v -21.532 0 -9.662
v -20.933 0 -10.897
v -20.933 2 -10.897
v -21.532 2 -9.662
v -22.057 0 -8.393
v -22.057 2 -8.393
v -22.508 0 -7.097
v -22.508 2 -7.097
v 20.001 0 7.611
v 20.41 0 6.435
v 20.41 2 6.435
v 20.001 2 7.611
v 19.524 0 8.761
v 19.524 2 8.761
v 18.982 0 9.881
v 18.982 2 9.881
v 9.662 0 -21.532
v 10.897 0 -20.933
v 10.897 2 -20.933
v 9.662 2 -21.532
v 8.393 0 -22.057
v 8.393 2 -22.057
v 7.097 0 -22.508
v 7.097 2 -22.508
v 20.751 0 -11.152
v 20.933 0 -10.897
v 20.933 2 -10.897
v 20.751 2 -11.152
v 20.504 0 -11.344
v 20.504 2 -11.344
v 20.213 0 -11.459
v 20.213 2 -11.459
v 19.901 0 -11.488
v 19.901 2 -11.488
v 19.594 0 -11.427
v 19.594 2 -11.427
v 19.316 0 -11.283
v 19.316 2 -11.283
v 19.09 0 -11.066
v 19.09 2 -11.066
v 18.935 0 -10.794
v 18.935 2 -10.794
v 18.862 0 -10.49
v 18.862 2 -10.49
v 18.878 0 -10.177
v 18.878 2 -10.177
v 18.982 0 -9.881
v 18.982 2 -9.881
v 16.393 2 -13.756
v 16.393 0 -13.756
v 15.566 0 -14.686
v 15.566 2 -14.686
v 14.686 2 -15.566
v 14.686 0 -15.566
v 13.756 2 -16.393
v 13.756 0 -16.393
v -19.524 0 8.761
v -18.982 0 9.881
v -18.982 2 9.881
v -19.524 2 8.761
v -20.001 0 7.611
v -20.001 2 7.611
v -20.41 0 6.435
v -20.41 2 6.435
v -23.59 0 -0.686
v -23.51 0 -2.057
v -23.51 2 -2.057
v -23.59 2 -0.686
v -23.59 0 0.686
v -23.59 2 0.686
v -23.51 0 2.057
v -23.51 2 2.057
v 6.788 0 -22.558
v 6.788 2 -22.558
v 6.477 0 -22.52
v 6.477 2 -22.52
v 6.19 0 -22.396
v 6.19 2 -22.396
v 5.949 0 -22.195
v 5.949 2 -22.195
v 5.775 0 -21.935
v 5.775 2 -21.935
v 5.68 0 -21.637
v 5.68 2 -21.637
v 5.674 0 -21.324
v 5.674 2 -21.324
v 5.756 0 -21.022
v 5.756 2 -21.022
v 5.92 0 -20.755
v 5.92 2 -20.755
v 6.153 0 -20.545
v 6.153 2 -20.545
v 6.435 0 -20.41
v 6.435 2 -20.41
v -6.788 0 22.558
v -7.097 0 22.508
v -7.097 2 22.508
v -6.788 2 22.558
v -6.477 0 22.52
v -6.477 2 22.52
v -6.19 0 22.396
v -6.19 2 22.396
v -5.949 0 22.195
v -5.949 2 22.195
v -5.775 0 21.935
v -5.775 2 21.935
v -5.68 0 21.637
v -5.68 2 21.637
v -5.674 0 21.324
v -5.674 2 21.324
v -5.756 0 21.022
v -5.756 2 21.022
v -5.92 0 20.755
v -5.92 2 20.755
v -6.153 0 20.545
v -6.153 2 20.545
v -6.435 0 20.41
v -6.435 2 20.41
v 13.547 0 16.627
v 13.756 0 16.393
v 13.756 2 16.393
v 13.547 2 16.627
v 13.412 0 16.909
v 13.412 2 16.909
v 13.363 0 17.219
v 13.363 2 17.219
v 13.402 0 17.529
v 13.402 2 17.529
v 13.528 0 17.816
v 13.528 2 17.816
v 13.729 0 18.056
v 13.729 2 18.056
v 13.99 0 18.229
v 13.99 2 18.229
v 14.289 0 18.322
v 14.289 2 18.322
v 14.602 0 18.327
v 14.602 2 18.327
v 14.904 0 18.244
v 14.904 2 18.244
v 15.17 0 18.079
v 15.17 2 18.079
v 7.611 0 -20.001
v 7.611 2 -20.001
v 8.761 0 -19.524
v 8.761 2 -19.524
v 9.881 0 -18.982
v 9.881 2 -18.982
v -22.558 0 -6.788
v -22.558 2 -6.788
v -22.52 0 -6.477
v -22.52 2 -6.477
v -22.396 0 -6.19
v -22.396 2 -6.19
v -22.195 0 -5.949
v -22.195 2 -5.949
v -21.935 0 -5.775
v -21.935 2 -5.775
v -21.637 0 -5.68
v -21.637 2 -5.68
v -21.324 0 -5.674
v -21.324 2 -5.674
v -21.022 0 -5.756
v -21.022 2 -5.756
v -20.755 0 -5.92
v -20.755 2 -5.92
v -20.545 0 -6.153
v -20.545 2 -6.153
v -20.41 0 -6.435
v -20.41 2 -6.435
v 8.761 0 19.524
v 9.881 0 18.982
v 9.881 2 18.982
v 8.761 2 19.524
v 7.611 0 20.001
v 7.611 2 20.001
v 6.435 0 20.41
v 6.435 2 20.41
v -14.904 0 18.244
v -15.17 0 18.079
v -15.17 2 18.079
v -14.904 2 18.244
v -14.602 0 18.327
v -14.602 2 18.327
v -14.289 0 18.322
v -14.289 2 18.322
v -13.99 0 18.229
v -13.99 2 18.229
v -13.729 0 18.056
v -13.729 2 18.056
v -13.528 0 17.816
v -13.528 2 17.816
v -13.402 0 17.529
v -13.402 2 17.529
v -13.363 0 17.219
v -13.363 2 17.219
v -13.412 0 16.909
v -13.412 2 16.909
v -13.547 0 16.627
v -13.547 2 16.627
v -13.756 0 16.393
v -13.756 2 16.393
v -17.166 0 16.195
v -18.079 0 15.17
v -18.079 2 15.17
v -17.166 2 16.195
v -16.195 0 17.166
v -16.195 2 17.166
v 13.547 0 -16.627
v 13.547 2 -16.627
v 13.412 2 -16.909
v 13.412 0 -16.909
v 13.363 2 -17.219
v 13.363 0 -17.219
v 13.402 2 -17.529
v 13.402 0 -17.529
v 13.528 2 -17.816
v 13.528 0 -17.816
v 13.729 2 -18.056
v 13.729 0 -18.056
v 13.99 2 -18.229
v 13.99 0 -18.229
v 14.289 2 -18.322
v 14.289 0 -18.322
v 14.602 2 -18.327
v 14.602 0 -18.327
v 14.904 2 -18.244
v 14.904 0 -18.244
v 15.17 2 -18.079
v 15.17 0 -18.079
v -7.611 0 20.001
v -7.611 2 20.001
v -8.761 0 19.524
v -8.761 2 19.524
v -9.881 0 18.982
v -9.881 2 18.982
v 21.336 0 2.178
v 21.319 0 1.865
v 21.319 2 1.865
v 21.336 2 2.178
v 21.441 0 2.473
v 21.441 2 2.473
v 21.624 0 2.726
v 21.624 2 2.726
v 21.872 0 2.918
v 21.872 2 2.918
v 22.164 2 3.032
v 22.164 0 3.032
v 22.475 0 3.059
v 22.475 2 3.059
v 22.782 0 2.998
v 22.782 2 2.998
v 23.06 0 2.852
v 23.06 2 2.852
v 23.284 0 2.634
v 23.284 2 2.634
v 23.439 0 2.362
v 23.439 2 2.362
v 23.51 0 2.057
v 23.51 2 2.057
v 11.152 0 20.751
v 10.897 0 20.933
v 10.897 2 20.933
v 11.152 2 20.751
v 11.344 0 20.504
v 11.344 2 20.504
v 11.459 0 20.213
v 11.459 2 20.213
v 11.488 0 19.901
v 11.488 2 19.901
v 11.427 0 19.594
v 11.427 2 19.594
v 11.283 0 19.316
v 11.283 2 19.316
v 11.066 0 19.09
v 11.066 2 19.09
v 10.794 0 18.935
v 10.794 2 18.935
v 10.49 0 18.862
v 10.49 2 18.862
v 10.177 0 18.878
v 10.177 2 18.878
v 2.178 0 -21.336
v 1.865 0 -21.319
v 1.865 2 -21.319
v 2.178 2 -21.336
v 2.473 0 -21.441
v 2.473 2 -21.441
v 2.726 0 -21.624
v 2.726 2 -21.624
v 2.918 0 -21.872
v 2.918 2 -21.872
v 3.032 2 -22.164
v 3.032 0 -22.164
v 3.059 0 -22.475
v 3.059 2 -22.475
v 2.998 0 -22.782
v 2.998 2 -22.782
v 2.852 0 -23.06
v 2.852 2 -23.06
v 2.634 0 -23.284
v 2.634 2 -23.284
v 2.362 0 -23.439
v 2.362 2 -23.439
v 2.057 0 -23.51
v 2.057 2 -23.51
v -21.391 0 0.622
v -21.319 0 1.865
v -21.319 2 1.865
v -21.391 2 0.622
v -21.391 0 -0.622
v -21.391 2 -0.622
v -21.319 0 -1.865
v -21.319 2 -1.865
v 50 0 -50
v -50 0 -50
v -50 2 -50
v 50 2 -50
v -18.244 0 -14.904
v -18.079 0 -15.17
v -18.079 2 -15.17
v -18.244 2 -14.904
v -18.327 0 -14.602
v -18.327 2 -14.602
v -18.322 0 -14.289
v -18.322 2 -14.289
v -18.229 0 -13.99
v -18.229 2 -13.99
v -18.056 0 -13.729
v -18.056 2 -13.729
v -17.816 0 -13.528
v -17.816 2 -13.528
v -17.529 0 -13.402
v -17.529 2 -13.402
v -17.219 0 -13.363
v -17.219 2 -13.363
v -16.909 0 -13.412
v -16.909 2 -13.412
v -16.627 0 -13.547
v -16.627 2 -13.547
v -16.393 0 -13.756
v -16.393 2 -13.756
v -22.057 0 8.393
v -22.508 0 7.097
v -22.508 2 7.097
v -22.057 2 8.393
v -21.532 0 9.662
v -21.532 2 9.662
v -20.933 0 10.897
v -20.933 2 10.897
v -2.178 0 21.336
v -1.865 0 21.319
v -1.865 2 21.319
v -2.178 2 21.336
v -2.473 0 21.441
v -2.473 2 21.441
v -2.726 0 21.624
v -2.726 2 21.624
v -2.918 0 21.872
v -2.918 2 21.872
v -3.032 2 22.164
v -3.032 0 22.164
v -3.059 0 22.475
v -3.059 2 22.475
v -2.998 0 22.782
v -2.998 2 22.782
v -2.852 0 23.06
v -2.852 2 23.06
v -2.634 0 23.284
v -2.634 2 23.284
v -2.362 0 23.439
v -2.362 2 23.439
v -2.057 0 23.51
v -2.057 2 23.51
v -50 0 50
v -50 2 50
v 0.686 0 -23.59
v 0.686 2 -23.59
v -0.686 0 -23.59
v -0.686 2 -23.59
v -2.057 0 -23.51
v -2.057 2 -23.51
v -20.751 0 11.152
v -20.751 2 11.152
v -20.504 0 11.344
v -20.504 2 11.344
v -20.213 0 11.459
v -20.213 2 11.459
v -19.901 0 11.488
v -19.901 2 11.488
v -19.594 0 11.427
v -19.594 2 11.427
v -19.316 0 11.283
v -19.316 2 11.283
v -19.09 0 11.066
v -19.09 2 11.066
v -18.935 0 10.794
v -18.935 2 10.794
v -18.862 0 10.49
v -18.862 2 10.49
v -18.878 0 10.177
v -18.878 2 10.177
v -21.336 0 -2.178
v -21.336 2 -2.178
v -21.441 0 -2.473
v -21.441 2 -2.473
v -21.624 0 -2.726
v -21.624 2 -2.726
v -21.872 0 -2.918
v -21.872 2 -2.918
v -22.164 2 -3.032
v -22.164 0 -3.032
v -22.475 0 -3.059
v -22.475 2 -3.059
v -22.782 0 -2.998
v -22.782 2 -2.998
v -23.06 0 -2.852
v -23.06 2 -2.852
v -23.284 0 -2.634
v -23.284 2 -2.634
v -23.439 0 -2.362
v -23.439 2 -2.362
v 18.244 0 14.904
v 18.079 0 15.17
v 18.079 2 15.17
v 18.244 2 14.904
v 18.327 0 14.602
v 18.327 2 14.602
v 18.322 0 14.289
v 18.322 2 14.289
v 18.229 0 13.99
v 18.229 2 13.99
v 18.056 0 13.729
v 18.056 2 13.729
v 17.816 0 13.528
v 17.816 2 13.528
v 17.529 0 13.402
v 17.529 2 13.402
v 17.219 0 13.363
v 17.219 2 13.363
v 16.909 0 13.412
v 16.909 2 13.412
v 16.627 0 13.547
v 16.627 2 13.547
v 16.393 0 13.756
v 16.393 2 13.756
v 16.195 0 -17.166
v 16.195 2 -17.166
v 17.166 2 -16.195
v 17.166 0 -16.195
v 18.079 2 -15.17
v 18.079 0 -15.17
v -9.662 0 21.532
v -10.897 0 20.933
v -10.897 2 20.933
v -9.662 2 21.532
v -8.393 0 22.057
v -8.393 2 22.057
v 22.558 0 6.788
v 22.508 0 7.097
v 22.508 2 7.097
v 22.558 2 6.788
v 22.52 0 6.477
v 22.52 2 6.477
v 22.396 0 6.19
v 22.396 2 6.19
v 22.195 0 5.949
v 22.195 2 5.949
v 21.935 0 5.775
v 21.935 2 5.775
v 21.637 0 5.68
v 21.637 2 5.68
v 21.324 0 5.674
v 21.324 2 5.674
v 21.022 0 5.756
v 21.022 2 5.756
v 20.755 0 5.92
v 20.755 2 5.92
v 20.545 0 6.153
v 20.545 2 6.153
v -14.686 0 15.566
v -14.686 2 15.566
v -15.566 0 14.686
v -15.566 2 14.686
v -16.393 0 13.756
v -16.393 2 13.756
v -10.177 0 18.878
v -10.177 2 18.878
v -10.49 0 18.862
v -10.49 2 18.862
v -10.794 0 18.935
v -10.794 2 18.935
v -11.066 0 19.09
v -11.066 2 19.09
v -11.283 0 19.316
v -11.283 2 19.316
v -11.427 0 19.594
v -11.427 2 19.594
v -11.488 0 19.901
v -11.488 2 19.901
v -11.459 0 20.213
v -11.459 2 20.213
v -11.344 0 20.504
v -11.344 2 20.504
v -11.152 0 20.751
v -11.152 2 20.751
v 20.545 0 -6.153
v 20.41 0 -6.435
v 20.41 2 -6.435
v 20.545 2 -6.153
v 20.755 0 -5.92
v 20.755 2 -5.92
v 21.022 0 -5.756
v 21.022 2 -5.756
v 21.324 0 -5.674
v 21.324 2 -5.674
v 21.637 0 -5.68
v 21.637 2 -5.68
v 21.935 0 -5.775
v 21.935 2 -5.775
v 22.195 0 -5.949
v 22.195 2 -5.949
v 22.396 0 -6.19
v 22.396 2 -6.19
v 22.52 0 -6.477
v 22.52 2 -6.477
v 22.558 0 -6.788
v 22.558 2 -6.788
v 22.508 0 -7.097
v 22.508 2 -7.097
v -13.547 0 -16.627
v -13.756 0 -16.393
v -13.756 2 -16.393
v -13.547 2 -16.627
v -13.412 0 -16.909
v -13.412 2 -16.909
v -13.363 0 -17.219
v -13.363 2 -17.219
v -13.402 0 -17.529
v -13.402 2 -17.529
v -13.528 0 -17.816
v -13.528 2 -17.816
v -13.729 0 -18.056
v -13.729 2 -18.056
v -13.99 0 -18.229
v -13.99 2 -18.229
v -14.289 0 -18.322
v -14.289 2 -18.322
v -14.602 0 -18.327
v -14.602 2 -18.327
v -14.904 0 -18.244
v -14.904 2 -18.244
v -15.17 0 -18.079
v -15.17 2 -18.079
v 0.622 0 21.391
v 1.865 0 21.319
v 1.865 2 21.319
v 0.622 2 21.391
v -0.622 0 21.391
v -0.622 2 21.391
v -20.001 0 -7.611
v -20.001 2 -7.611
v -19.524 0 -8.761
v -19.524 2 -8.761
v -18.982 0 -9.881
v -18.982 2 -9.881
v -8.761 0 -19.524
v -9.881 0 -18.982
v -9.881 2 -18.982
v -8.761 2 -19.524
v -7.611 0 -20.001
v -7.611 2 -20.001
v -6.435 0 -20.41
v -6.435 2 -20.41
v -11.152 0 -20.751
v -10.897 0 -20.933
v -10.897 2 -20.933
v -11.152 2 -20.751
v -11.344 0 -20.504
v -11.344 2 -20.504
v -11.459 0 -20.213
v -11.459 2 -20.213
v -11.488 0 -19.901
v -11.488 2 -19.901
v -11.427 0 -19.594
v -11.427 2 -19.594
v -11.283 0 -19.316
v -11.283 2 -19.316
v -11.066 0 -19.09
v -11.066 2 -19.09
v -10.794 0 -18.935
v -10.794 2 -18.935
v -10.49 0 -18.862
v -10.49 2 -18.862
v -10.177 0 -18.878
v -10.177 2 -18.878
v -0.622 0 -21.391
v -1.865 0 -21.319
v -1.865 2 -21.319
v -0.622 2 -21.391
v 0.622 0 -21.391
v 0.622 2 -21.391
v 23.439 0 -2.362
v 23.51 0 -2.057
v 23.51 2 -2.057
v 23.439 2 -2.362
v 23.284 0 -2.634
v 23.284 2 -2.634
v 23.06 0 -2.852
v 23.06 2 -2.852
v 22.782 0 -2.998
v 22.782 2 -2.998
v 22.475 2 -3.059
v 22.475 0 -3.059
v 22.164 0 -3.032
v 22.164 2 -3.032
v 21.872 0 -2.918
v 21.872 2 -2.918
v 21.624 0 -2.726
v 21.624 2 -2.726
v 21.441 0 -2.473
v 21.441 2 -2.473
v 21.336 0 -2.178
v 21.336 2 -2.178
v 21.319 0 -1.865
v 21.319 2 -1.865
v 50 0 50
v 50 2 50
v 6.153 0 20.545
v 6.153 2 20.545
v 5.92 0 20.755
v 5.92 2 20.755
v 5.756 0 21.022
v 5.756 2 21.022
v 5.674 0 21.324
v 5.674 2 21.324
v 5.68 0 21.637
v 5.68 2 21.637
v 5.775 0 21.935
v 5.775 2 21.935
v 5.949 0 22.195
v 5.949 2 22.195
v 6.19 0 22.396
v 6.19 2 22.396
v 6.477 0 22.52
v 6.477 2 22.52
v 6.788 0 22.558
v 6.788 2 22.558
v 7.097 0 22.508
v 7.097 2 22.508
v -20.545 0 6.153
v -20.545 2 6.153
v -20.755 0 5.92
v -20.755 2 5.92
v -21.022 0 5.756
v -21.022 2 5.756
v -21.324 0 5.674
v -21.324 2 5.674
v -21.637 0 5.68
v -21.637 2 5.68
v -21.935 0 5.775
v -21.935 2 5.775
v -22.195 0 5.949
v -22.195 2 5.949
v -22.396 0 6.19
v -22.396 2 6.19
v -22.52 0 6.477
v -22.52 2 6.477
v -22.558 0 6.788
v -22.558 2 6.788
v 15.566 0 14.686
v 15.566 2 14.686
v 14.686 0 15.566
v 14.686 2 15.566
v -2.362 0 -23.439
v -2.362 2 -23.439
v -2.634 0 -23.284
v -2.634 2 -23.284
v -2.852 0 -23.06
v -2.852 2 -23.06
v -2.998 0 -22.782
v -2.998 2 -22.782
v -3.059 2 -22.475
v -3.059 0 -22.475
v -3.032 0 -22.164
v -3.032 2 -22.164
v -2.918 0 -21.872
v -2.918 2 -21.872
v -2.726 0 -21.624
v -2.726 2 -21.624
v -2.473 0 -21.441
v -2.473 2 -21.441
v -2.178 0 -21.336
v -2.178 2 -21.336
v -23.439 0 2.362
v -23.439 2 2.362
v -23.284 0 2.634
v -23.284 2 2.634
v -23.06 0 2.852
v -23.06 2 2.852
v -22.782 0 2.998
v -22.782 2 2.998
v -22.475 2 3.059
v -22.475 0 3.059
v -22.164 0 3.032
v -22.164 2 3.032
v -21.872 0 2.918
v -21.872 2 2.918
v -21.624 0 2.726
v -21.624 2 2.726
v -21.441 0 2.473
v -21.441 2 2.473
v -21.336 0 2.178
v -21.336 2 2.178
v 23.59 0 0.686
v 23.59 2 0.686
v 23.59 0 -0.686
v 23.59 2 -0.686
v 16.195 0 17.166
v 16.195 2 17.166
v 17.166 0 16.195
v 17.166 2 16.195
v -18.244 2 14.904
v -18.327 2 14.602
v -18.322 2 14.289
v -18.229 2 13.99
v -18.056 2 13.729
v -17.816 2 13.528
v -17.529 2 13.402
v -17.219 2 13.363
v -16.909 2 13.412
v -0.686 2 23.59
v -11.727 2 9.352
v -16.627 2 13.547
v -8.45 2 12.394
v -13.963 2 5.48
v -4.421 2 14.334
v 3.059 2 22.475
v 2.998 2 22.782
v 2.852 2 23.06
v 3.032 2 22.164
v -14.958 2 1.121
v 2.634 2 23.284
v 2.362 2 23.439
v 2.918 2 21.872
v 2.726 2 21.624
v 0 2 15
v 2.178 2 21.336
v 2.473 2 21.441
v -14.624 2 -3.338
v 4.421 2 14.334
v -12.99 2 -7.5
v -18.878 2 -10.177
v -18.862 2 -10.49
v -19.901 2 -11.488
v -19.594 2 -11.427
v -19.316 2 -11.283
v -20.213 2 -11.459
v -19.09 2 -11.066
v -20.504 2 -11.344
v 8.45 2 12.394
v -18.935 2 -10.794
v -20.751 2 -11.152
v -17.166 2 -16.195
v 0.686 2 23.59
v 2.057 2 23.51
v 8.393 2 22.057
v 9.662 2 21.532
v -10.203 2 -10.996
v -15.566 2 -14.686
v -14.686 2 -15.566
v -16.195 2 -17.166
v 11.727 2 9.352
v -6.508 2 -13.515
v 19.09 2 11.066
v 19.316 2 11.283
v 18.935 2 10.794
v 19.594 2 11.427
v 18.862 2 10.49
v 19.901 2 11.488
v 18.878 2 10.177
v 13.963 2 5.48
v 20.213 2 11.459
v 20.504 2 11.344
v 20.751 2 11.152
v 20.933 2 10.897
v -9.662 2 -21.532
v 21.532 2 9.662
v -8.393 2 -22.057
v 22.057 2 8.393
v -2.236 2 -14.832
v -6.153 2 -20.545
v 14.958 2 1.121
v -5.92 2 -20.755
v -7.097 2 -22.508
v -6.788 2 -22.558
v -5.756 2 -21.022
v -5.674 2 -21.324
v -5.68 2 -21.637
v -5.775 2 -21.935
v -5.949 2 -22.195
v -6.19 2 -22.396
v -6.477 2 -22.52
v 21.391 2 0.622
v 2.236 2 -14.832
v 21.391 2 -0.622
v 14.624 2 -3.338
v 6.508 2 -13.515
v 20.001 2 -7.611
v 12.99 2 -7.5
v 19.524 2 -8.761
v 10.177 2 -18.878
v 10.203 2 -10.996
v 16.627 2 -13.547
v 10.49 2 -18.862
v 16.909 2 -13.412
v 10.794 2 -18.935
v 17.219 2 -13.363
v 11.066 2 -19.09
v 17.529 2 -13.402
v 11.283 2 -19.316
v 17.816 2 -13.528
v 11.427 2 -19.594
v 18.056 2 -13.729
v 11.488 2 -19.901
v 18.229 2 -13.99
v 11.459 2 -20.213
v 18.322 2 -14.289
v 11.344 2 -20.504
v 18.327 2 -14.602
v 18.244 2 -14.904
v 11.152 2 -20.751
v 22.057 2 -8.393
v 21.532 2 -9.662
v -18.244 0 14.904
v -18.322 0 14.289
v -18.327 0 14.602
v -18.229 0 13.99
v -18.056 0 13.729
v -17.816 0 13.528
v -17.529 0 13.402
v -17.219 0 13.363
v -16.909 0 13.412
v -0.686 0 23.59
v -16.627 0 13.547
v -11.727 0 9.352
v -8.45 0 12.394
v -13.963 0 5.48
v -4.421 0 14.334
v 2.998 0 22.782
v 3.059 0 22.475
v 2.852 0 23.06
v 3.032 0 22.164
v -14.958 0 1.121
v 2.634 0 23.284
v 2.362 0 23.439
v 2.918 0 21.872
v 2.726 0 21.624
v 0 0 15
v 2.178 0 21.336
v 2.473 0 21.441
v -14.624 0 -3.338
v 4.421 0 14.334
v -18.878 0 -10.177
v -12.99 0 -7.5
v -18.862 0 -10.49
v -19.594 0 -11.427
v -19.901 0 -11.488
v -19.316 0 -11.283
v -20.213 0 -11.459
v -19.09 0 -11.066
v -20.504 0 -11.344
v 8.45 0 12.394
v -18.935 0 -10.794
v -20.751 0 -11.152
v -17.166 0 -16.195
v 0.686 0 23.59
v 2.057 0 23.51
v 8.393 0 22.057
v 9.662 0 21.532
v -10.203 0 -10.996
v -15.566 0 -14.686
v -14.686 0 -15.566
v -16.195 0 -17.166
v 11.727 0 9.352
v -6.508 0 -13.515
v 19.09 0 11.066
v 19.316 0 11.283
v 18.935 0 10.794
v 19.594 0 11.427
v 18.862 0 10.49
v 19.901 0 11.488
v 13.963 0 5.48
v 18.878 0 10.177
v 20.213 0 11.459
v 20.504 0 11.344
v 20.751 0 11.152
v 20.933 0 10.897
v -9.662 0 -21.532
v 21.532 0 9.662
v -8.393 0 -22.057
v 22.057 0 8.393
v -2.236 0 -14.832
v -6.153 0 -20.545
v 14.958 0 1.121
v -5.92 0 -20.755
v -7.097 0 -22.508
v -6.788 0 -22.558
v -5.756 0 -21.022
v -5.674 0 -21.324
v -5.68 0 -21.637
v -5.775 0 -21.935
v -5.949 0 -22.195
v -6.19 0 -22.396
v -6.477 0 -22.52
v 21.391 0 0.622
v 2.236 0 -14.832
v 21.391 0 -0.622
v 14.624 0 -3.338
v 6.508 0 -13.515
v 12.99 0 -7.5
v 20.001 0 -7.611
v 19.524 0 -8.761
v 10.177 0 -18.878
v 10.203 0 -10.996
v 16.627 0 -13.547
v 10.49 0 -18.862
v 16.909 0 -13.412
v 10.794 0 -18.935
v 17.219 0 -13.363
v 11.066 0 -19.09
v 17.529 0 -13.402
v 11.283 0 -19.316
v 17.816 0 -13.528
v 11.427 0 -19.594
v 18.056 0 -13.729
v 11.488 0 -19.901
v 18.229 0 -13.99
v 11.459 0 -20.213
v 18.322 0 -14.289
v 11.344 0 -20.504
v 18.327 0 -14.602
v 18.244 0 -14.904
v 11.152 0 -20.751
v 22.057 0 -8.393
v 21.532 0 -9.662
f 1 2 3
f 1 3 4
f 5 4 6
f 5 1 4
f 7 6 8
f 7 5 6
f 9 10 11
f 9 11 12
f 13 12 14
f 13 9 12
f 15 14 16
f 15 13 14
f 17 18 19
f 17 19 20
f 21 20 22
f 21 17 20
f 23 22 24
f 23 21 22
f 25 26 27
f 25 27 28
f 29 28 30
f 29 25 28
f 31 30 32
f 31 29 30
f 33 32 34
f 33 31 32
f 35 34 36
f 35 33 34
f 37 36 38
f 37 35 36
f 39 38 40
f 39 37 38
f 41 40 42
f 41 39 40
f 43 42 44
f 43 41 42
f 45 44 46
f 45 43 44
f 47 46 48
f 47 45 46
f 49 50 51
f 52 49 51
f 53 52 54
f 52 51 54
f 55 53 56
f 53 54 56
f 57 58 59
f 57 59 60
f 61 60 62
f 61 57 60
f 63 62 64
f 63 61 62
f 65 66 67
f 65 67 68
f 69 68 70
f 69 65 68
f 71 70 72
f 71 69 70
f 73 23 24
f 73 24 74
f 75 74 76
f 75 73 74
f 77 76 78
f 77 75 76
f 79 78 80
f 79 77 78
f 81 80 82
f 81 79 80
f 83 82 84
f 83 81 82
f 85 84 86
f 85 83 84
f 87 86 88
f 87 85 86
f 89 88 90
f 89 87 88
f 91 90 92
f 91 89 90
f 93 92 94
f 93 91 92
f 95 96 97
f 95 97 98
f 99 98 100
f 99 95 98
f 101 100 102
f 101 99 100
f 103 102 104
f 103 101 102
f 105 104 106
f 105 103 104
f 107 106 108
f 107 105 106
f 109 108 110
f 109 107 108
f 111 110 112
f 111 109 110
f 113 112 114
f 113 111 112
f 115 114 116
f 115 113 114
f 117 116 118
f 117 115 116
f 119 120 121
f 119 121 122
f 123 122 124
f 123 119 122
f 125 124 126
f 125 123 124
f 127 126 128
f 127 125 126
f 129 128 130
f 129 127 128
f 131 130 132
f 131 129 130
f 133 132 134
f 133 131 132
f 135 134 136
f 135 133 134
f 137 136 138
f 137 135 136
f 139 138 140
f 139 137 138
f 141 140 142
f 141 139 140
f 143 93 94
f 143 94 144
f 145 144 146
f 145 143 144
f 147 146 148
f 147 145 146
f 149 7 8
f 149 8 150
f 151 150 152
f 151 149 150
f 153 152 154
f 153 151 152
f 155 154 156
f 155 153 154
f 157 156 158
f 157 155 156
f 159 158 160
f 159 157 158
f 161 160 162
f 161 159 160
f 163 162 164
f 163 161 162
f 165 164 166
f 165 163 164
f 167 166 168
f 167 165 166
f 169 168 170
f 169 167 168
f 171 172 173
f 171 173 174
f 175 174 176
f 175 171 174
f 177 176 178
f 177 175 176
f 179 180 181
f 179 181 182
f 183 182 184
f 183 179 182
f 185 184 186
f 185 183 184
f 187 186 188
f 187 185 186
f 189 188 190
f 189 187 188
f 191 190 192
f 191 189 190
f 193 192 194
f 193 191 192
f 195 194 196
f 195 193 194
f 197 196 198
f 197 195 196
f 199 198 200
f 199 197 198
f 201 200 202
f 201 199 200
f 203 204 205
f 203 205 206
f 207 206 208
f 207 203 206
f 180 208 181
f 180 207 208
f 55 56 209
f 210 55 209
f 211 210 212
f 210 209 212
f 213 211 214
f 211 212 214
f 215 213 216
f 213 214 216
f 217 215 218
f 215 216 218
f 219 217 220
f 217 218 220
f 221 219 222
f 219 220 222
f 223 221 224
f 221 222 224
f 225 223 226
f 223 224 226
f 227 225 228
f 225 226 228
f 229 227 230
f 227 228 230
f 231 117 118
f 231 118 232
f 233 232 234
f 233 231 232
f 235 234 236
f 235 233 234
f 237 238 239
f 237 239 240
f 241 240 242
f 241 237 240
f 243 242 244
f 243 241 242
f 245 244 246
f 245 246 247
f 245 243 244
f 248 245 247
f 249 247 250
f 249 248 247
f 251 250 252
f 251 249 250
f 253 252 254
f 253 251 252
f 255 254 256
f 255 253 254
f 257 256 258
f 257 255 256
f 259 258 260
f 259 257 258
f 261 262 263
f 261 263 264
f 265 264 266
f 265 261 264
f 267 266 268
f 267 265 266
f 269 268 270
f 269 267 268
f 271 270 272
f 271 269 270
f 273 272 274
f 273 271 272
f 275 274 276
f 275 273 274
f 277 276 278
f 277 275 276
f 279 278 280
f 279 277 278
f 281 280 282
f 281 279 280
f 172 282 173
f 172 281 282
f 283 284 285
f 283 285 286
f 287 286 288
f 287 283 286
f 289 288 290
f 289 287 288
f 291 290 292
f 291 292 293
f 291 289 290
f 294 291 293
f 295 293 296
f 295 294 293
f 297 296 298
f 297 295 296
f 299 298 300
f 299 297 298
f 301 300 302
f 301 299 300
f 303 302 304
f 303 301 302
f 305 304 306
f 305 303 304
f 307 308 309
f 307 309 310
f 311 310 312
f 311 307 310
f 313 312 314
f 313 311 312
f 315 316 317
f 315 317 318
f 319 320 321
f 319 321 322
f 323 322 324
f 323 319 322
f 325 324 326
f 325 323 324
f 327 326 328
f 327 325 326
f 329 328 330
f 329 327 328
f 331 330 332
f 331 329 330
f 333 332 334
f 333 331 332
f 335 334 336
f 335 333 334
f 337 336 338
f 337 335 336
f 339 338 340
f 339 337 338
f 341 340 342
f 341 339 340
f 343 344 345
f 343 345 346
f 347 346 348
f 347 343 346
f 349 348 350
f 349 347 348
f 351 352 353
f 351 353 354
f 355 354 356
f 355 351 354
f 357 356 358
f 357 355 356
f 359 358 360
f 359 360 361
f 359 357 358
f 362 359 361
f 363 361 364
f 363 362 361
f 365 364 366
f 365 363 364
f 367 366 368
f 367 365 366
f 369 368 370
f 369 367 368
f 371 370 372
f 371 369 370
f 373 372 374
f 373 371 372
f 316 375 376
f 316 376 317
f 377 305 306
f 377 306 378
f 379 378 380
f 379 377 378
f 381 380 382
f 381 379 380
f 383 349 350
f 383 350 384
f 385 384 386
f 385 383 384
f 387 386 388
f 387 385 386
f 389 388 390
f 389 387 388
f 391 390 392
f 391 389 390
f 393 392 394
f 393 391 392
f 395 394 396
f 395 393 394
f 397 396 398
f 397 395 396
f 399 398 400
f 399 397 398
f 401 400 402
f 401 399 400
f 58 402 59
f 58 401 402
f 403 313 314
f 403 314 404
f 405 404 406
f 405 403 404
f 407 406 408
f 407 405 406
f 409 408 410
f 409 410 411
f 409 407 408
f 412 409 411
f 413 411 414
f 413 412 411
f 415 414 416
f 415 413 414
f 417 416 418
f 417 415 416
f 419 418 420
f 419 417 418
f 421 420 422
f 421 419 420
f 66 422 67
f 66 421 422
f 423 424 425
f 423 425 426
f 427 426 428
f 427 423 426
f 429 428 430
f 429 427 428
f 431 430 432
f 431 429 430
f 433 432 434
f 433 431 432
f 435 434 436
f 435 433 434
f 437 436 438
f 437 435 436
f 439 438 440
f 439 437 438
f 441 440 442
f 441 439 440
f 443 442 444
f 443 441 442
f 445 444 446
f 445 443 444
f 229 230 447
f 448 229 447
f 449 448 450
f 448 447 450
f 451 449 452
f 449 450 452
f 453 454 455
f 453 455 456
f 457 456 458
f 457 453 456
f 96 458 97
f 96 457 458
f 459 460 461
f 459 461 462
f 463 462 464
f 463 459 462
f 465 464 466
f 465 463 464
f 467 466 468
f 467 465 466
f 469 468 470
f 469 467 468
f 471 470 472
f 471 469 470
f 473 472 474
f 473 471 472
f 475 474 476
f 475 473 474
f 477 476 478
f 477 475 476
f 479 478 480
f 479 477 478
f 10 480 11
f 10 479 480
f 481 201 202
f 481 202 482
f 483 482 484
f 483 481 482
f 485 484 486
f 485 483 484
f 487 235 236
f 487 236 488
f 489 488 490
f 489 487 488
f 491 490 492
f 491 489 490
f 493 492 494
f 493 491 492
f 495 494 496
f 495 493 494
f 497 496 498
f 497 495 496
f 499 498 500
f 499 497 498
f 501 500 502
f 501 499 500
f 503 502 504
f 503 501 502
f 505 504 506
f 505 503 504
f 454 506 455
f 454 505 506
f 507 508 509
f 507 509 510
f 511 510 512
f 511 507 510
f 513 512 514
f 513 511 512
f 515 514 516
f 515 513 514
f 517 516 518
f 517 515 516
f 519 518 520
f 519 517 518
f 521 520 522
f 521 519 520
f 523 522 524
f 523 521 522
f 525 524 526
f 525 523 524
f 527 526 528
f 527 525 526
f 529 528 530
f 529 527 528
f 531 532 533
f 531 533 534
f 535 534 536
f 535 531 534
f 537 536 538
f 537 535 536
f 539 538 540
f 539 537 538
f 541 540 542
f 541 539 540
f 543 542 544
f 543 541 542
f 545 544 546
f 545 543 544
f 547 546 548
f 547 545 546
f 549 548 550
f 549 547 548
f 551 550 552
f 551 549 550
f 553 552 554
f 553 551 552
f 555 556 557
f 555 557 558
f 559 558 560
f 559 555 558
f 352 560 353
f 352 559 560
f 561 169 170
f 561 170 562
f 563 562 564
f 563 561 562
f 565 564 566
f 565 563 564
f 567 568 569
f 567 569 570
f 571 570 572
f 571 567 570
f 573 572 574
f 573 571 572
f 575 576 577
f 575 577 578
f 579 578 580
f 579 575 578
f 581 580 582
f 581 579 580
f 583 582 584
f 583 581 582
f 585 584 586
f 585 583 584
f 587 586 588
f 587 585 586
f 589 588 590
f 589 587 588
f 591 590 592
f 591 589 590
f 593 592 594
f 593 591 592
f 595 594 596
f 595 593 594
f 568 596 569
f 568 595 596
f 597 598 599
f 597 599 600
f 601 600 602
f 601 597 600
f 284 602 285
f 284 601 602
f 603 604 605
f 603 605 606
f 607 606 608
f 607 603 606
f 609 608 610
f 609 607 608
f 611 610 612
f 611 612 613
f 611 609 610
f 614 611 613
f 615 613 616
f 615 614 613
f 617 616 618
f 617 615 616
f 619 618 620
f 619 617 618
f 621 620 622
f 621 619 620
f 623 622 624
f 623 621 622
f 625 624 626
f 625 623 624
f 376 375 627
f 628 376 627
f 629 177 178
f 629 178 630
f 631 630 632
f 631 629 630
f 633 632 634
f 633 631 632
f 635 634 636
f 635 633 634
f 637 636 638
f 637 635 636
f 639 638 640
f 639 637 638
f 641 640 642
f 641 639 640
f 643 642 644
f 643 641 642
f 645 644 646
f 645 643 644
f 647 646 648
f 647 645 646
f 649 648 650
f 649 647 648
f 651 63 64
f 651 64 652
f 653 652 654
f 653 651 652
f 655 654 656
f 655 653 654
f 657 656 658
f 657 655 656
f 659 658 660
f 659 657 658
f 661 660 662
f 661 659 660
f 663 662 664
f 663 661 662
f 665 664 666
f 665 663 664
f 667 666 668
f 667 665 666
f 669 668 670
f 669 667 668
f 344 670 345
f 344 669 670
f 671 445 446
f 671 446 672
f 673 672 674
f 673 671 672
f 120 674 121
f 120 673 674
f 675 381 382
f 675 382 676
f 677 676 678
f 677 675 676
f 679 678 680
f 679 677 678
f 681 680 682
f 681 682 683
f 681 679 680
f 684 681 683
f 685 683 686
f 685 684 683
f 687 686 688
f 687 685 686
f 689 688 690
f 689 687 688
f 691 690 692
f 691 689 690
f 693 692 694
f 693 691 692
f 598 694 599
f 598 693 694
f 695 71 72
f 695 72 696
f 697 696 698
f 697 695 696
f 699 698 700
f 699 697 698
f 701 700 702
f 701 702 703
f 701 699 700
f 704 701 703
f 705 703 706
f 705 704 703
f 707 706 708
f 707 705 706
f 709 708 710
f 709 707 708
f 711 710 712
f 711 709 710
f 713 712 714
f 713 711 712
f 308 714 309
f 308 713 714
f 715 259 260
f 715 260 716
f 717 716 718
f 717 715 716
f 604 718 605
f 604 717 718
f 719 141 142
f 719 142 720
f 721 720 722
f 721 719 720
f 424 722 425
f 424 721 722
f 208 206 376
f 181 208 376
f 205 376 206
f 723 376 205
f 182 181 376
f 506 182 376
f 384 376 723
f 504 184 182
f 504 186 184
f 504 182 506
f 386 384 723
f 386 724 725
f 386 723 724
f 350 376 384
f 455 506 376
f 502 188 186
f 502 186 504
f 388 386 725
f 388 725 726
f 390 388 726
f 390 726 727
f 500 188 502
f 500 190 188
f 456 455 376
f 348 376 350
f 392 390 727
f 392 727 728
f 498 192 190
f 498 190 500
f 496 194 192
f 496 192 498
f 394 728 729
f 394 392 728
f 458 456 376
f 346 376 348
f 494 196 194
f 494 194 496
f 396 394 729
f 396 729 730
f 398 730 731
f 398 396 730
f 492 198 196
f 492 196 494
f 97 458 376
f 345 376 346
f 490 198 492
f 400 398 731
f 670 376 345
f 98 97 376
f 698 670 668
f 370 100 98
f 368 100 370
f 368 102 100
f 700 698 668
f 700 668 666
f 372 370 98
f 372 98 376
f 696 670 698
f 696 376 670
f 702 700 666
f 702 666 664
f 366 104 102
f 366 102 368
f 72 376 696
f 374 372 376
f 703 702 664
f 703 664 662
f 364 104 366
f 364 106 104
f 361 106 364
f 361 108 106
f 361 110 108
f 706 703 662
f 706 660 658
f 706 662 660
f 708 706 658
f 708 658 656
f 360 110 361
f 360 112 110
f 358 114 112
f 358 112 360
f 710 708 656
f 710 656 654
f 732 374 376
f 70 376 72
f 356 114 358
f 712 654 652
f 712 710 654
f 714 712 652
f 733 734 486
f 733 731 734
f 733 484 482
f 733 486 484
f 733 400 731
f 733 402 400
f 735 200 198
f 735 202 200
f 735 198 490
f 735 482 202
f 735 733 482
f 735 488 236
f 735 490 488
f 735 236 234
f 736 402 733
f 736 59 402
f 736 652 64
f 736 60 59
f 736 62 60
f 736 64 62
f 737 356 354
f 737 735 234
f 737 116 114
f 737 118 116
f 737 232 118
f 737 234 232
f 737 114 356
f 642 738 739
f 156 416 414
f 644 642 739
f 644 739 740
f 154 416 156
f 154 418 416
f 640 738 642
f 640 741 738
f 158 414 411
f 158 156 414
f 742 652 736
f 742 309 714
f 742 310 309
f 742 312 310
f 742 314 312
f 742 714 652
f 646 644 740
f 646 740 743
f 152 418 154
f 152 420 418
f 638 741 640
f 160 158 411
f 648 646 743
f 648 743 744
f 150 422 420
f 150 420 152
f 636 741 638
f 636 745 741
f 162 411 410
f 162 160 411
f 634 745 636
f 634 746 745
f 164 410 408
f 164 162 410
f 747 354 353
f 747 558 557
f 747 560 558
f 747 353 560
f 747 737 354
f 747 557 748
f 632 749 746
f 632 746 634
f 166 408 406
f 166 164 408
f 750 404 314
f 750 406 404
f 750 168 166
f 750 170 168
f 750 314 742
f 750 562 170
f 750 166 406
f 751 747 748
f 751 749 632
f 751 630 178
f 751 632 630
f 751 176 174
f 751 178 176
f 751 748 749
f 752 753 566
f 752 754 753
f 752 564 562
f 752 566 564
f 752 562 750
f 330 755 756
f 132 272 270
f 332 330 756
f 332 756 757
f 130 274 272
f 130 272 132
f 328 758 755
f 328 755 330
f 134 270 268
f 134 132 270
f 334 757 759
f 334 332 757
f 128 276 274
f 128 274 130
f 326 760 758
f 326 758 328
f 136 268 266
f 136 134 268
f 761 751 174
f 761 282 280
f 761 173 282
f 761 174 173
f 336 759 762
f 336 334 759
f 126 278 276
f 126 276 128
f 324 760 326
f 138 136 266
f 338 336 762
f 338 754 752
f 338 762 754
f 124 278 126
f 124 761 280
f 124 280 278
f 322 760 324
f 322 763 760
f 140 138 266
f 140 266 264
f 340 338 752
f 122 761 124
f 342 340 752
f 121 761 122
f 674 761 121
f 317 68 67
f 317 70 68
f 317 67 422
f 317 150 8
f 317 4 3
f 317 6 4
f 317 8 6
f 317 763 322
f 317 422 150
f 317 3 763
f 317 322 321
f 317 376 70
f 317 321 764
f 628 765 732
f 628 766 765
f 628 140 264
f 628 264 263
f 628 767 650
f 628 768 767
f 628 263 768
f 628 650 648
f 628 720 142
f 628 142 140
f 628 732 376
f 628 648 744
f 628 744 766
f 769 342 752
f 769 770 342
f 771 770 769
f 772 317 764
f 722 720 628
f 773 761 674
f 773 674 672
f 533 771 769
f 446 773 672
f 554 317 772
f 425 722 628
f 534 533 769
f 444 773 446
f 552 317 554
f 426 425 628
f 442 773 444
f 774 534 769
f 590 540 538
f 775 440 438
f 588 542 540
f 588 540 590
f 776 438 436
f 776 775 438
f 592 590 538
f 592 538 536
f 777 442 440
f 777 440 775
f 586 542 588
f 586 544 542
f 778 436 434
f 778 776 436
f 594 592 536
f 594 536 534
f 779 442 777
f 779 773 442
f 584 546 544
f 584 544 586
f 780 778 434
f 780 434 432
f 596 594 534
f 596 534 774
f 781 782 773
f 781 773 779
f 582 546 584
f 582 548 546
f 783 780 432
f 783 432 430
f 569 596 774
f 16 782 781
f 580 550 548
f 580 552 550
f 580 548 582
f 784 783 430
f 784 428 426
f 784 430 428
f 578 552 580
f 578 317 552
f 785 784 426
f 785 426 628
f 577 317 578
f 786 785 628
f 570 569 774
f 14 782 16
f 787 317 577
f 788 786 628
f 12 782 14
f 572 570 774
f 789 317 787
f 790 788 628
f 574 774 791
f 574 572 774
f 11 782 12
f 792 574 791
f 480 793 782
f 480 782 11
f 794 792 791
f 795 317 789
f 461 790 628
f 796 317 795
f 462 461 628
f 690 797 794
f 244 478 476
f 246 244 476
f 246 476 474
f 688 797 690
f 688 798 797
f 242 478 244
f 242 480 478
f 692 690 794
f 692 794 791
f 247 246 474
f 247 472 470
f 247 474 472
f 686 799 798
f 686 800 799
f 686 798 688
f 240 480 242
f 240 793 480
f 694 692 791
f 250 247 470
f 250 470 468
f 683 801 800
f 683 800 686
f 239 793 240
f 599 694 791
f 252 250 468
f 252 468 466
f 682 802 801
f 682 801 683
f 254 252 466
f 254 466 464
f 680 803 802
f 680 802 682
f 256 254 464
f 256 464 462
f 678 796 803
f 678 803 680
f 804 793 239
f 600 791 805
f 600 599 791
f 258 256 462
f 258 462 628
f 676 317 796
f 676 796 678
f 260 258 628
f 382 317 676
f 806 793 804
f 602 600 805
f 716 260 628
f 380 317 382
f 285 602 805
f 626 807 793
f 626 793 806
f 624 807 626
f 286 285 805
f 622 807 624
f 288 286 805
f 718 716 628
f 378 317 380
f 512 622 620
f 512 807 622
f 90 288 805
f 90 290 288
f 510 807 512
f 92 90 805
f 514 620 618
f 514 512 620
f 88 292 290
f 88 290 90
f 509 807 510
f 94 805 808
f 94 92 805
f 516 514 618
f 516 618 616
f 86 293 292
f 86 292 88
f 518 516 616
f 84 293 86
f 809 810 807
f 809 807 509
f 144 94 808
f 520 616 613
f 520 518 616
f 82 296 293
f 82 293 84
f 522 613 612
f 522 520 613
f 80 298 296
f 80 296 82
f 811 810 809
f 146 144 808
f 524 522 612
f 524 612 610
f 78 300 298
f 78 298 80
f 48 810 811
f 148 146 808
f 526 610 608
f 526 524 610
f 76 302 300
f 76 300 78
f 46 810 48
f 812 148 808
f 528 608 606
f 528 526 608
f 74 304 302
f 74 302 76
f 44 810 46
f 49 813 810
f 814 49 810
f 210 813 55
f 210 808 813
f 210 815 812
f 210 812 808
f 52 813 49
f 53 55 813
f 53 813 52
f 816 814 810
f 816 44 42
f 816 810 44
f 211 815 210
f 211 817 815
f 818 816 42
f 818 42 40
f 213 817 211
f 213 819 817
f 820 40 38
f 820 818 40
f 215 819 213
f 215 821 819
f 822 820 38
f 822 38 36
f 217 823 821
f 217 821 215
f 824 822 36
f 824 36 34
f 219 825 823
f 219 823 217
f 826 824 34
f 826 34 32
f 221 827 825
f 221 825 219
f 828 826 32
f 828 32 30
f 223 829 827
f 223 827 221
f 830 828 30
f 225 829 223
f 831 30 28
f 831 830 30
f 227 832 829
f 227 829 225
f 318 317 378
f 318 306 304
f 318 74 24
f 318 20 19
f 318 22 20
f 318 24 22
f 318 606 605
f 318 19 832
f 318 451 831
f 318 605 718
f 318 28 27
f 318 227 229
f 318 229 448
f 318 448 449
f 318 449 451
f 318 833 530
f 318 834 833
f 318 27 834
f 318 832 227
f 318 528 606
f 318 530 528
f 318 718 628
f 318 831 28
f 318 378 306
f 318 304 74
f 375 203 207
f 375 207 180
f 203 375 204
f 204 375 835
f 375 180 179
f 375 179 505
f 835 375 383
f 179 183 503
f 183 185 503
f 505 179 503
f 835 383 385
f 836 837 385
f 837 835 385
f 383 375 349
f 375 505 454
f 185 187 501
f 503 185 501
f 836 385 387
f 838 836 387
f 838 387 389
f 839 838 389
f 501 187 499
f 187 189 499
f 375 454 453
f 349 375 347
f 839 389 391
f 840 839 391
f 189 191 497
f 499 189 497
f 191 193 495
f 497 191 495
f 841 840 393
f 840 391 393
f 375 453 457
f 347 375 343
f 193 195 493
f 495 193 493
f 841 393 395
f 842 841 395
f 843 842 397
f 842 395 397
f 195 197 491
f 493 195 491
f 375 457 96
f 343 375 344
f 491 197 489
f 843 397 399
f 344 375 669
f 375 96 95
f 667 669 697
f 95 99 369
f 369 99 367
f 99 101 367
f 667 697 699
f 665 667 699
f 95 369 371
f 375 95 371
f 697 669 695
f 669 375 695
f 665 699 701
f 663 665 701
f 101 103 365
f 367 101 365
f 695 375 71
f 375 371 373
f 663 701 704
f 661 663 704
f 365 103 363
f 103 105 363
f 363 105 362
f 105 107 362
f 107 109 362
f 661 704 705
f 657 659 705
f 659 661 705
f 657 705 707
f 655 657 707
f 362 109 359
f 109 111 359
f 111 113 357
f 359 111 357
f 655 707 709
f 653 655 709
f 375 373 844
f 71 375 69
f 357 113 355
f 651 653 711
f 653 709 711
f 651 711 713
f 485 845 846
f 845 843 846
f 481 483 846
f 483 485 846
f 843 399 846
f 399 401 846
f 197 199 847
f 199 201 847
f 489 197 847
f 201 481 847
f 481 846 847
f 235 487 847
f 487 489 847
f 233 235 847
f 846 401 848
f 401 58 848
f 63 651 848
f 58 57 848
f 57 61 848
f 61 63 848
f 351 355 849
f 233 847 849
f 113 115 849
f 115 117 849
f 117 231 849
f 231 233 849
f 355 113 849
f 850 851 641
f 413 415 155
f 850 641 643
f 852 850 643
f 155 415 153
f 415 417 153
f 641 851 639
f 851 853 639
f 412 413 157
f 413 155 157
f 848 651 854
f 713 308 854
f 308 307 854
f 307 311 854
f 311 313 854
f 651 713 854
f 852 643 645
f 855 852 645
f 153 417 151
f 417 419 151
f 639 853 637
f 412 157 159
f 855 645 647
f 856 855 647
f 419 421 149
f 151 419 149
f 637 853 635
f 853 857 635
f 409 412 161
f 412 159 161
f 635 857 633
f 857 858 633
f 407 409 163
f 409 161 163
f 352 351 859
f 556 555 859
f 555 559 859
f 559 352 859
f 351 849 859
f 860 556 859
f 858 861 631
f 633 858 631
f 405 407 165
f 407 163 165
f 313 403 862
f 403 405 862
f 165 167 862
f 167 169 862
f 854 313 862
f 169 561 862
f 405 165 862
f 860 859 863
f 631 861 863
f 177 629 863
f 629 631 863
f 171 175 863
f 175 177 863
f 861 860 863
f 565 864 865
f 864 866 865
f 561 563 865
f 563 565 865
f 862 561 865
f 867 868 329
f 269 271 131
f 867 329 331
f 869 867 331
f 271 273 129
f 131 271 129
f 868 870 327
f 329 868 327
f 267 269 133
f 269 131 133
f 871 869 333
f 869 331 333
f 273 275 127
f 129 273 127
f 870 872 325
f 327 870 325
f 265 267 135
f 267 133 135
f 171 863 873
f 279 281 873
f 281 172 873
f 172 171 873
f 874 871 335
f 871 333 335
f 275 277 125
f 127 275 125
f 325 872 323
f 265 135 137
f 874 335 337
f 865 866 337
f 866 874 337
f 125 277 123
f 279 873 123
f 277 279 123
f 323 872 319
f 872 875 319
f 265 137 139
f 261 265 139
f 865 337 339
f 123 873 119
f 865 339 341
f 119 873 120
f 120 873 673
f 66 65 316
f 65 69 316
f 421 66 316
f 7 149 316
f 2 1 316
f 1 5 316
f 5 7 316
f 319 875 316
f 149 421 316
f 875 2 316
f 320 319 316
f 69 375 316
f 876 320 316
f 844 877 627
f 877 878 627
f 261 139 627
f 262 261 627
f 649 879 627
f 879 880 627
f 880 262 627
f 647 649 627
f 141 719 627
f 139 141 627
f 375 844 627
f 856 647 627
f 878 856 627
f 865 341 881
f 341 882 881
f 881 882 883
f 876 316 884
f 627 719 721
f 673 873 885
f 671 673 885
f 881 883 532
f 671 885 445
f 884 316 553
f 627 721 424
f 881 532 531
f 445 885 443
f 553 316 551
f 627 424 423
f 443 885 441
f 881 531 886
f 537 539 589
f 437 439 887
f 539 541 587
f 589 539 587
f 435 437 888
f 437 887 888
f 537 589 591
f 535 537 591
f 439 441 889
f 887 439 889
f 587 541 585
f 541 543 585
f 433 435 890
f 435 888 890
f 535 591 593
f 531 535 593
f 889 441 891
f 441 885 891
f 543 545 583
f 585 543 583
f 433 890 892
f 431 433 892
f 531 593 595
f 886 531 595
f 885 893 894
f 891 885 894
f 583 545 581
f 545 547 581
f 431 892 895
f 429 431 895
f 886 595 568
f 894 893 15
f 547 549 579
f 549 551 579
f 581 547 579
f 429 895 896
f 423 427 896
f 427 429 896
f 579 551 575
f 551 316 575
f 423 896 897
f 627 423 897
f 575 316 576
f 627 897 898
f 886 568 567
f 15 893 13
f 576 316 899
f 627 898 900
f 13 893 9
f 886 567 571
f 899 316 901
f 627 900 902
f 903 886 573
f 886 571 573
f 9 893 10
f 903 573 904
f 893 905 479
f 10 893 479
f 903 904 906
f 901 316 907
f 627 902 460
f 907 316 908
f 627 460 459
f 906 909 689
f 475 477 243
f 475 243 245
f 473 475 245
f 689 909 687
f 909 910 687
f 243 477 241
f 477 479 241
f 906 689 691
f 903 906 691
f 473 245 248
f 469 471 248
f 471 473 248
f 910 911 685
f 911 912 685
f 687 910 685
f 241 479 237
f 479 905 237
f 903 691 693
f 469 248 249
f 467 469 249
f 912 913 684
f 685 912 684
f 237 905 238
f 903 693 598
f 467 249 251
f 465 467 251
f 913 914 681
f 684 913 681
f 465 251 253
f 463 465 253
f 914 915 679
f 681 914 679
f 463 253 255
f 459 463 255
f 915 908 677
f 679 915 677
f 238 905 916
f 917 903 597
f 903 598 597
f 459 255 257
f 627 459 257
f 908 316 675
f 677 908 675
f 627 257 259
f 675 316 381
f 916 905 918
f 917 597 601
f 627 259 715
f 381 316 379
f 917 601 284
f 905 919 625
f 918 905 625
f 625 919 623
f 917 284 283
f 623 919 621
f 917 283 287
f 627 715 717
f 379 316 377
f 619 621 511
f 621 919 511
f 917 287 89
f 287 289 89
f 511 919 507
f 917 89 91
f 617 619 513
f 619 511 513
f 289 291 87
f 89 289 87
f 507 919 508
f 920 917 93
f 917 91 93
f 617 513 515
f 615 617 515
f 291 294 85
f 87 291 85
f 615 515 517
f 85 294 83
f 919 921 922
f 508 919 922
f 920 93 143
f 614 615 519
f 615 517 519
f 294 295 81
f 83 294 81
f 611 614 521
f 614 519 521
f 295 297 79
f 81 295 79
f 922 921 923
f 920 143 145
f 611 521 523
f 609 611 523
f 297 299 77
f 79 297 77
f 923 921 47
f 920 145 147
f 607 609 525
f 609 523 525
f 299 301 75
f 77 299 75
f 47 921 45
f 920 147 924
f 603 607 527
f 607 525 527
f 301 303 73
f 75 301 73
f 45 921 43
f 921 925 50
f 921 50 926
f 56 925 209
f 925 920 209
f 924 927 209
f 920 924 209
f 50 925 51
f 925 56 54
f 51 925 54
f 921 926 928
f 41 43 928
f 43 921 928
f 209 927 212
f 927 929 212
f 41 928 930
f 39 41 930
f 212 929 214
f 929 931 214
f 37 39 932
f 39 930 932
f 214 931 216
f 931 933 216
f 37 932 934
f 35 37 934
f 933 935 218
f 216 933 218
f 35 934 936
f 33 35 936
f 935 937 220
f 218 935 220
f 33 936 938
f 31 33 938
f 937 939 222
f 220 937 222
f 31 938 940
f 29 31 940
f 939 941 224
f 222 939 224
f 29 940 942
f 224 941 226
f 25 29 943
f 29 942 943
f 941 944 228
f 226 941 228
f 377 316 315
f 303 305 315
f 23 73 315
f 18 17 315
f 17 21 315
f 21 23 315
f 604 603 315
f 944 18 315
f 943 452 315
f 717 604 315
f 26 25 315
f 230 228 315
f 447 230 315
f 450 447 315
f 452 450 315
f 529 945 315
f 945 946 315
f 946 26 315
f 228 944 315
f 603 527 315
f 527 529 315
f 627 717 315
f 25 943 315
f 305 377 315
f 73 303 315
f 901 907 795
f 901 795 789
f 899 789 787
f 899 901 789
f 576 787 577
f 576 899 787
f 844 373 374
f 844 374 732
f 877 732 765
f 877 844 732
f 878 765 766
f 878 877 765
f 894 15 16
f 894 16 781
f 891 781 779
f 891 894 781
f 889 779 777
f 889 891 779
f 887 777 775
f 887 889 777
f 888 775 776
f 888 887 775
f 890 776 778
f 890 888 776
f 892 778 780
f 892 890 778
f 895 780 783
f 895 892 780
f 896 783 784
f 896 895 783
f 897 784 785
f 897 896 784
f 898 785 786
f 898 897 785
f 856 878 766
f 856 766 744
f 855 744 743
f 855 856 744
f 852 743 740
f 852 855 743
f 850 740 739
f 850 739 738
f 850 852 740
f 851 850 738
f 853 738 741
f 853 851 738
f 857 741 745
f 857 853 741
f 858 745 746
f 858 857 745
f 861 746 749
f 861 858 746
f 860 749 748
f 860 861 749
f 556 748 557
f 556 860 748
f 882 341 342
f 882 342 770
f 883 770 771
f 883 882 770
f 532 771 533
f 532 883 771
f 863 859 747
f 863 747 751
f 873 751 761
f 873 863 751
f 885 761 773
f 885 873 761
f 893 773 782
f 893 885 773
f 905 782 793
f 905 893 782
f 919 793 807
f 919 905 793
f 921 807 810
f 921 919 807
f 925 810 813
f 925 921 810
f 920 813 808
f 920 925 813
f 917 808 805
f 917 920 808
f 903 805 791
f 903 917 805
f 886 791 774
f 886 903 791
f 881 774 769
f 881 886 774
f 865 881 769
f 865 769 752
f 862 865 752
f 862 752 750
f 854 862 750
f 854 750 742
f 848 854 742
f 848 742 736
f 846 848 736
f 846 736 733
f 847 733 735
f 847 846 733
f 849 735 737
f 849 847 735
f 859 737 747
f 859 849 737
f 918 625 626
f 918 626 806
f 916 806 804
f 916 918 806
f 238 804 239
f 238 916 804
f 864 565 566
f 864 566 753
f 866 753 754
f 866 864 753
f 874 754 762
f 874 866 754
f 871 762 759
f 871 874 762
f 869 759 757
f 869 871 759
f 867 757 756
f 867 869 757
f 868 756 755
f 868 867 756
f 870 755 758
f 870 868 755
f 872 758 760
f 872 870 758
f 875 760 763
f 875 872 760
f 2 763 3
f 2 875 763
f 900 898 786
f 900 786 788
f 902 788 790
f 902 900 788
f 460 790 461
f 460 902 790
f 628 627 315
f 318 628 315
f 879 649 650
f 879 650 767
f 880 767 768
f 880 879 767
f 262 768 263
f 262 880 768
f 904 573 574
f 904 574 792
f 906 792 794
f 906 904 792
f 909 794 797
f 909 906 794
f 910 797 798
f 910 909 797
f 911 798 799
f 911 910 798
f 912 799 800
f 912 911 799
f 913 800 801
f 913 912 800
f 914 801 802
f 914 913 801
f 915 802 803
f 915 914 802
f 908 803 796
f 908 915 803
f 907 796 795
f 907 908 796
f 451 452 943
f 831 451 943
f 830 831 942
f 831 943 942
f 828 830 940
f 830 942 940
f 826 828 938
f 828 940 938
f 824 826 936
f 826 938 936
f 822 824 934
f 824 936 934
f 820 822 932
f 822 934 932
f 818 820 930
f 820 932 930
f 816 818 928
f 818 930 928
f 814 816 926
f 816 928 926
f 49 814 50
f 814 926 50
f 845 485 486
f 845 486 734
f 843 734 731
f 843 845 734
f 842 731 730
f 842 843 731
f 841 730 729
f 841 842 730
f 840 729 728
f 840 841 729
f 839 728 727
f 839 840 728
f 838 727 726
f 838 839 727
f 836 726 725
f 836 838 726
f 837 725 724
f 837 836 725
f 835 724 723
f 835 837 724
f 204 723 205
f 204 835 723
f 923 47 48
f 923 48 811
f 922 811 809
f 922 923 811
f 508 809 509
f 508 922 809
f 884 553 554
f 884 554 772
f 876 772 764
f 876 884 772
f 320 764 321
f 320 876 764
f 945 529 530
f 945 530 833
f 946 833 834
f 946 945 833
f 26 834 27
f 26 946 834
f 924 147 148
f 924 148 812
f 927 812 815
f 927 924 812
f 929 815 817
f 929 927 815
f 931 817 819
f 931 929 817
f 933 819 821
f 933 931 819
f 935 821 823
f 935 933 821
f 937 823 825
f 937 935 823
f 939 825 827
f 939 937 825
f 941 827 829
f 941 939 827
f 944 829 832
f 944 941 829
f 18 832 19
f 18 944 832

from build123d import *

# Parameters (mm, degrees)
SKETCH_1_W      = 100
SKETCH_1_H      = 100
SKETCH_1_R      = 15
EXTRUDE_1_DEPTH = 2


with BuildPart() as part:
    # 草图1 → 凸台-拉伸1 (new body)
    with BuildSketch(Plane(origin=(0, 0, 0), x_dir=(1, 0, 0), z_dir=(0, 1, 0))):
        Rectangle(SKETCH_1_W, SKETCH_1_H)
        with Locations(Location((0, 0, 0), (0, 0, 270))):
            Circle(SKETCH_1_R, mode=Mode.SUBTRACT)
        with BuildLine():
            ThreePointArc((16.393351083, 13.755654847), (15.132085117, 15.132085117), (13.755654847, 16.393351083))
            ThreePointArc((13.755654847, 16.393351083), (13.620072331, 17.943066341), (15.169787589, 18.078648858))
            ThreePointArc((15.169787589, 18.078648858), (16.687720036, 16.687720036), (18.078648858, 15.169787589))
            ThreePointArc((18.078648858, 15.169787589), (17.943066341, 13.620072331), (16.393351083, 13.755654847))
        make_face(mode=Mode.SUBTRACT)
        with BuildLine():
            ThreePointArc((20.933455663, 10.897267272), (19.449820272, 11.365055714), (18.98203183, 9.881420323))
            ThreePointArc((18.98203183, 9.881420323), (19.771021996, 8.189425453), (20.409542746, 6.435104109))
            ThreePointArc((20.409542746, 6.435104109), (21.789407771, 5.716791843), (22.507720038, 7.096656868))
            ThreePointArc((22.507720038, 7.096656868), (21.803556967, 9.031329004), (20.933455663, 10.897267272))
        make_face(mode=Mode.SUBTRACT)
        with BuildLine():
            ThreePointArc((23.510194875, 2.056875529), (22.31850939, 3.05681838), (21.318566539, 1.865132895))
            ThreePointArc((21.318566539, 1.865132895), (21.4, 0), (21.318566539, -1.865132895))
            ThreePointArc((21.318566539, -1.865132895), (22.31850939, -3.05681838), (23.510194875, -2.056875529))
            ThreePointArc((23.510194875, -2.056875529), (23.6, 0), (23.510194875, 2.056875529))
        make_face(mode=Mode.SUBTRACT)
        with BuildLine():
            ThreePointArc((22.507720038, -7.096656868), (21.789407771, -5.716791843), (20.409542746, -6.435104109))
            ThreePointArc((20.409542746, -6.435104109), (19.771021996, -8.189425453), (18.98203183, -9.881420323))
            ThreePointArc((18.98203183, -9.881420323), (19.449820272, -11.365055714), (20.933455663, -10.897267272))
            ThreePointArc((20.933455663, -10.897267272), (21.803556967, -9.031329004), (22.507720038, -7.096656868))
        make_face(mode=Mode.SUBTRACT)
        with BuildLine():
            ThreePointArc((18.078648858, -15.169787589), (17.943066341, -13.620072331), (16.393351083, -13.755654847))
            ThreePointArc((16.393351083, -13.755654847), (15.132085117, -15.132085117), (13.755654847, -16.393351083))
            ThreePointArc((13.755654847, -16.393351083), (13.620072331, -17.943066341), (15.169787589, -18.078648858))
            ThreePointArc((15.169787589, -18.078648858), (16.687720036, -16.687720036), (18.078648858, -15.169787589))
        make_face(mode=Mode.SUBTRACT)
        with BuildLine():
            ThreePointArc((10.897267272, -20.933455663), (11.365055714, -19.449820272), (9.881420323, -18.98203183))
            ThreePointArc((9.881420323, -18.98203183), (8.189425453, -19.771021996), (6.435104109, -20.409542746))
            ThreePointArc((6.435104109, -20.409542746), (5.716791843, -21.789407771), (7.096656868, -22.507720038))
            ThreePointArc((7.096656868, -22.507720038), (9.031329004, -21.803556967), (10.897267272, -20.933455663))
        make_face(mode=Mode.SUBTRACT)
        with BuildLine():
            ThreePointArc((2.056875529, -23.510194875), (3.05681838, -22.31850939), (1.865132895, -21.318566539))
            ThreePointArc((1.865132895, -21.318566539), (0, -21.4), (-1.865132895, -21.318566539))
            ThreePointArc((-1.865132895, -21.318566539), (-3.05681838, -22.31850939), (-2.056875529, -23.510194875))
            ThreePointArc((-2.056875529, -23.510194875), (0, -23.6), (2.056875529, -23.510194875))
        make_face(mode=Mode.SUBTRACT)
        with BuildLine():
            ThreePointArc((-7.096656868, -22.507720038), (-5.716791843, -21.789407771), (-6.435104109, -20.409542746))
            ThreePointArc((-6.435104109, -20.409542746), (-8.189425453, -19.771021996), (-9.881420323, -18.98203183))
            ThreePointArc((-9.881420323, -18.98203183), (-11.365055714, -19.449820272), (-10.897267272, -20.933455663))
            ThreePointArc((-10.897267272, -20.933455663), (-9.031329004, -21.803556967), (-7.096656868, -22.507720038))
        make_face(mode=Mode.SUBTRACT)
        with BuildLine():
            ThreePointArc((-15.169787589, -18.078648858), (-13.620072331, -17.943066341), (-13.755654847, -16.393351083))
            ThreePointArc((-13.755654847, -16.393351083), (-15.132085117, -15.132085117), (-16.393351083, -13.755654847))
            ThreePointArc((-16.393351083, -13.755654847), (-17.943066341, -13.620072331), (-18.078648858, -15.169787589))
            ThreePointArc((-18.078648858, -15.169787589), (-16.687720036, -16.687720036), (-15.169787589, -18.078648858))
        make_face(mode=Mode.SUBTRACT)
        with BuildLine():
            ThreePointArc((-20.933455663, -10.897267272), (-19.449820272, -11.365055714), (-18.98203183, -9.881420323))
            ThreePointArc((-18.98203183, -9.881420323), (-19.771021996, -8.189425453), (-20.409542746, -6.435104109))
            ThreePointArc((-20.409542746, -6.435104109), (-21.789407771, -5.716791843), (-22.507720038, -7.096656868))
            ThreePointArc((-22.507720038, -7.096656868), (-21.803556967, -9.031329004), (-20.933455663, -10.897267272))
        make_face(mode=Mode.SUBTRACT)
        with BuildLine():
            ThreePointArc((-23.510194875, -2.056875529), (-22.31850939, -3.05681838), (-21.318566539, -1.865132895))
            ThreePointArc((-21.318566539, -1.865132895), (-21.4, 0), (-21.318566539, 1.865132895))
            ThreePointArc((-21.318566539, 1.865132895), (-22.31850939, 3.05681838), (-23.510194875, 2.056875529))
            ThreePointArc((-23.510194875, 2.056875529), (-23.6, 0), (-23.510194875, -2.056875529))
        make_face(mode=Mode.SUBTRACT)
        with BuildLine():
            ThreePointArc((-22.507720038, 7.096656868), (-21.789407771, 5.716791843), (-20.409542746, 6.435104109))
            ThreePointArc((-20.409542746, 6.435104109), (-19.771021996, 8.189425453), (-18.98203183, 9.881420323))
            ThreePointArc((-18.98203183, 9.881420323), (-19.449820272, 11.365055714), (-20.933455663, 10.897267272))
            ThreePointArc((-20.933455663, 10.897267272), (-21.803556967, 9.031329004), (-22.507720038, 7.096656868))
        make_face(mode=Mode.SUBTRACT)
        with BuildLine():
            ThreePointArc((-18.078648858, 15.169787589), (-17.943066341, 13.620072331), (-16.393351083, 13.755654847))
            ThreePointArc((-16.393351083, 13.755654847), (-15.132085117, 15.132085117), (-13.755654847, 16.393351083))
            ThreePointArc((-13.755654847, 16.393351083), (-13.620072331, 17.943066341), (-15.169787589, 18.078648858))
            ThreePointArc((-15.169787589, 18.078648858), (-16.687720036, 16.687720036), (-18.078648858, 15.169787589))
        make_face(mode=Mode.SUBTRACT)
        with BuildLine():
            ThreePointArc((-10.897267272, 20.933455663), (-11.365055714, 19.449820272), (-9.881420323, 18.98203183))
            ThreePointArc((-9.881420323, 18.98203183), (-8.189425453, 19.771021996), (-6.435104109, 20.409542746))
            ThreePointArc((-6.435104109, 20.409542746), (-5.716791843, 21.789407771), (-7.096656868, 22.507720038))
            ThreePointArc((-7.096656868, 22.507720038), (-9.031329004, 21.803556967), (-10.897267272, 20.933455663))
        make_face(mode=Mode.SUBTRACT)
        with BuildLine():
            ThreePointArc((-2.056875529, 23.510194875), (-3.05681838, 22.31850939), (-1.865132895, 21.318566539))
            ThreePointArc((-1.865132895, 21.318566539), (0, 21.4), (1.865132895, 21.318566539))
            ThreePointArc((1.865132895, 21.318566539), (3.05681838, 22.31850939), (2.056875529, 23.510194875))
            ThreePointArc((2.056875529, 23.510194875), (0, 23.6), (-2.056875529, 23.510194875))
        make_face(mode=Mode.SUBTRACT)
        with BuildLine():
            ThreePointArc((7.096656868, 22.507720038), (5.716791843, 21.789407771), (6.435104109, 20.409542746))
            ThreePointArc((6.435104109, 20.409542746), (8.189425453, 19.771021996), (9.881420323, 18.98203183))
            ThreePointArc((9.881420323, 18.98203183), (11.365055714, 19.449820272), (10.897267272, 20.933455663))
            ThreePointArc((10.897267272, 20.933455663), (9.031329004, 21.803556967), (7.096656868, 22.507720038))
        make_face(mode=Mode.SUBTRACT)
    extrude(amount=EXTRUDE_1_DEPTH)


solid = part.part
